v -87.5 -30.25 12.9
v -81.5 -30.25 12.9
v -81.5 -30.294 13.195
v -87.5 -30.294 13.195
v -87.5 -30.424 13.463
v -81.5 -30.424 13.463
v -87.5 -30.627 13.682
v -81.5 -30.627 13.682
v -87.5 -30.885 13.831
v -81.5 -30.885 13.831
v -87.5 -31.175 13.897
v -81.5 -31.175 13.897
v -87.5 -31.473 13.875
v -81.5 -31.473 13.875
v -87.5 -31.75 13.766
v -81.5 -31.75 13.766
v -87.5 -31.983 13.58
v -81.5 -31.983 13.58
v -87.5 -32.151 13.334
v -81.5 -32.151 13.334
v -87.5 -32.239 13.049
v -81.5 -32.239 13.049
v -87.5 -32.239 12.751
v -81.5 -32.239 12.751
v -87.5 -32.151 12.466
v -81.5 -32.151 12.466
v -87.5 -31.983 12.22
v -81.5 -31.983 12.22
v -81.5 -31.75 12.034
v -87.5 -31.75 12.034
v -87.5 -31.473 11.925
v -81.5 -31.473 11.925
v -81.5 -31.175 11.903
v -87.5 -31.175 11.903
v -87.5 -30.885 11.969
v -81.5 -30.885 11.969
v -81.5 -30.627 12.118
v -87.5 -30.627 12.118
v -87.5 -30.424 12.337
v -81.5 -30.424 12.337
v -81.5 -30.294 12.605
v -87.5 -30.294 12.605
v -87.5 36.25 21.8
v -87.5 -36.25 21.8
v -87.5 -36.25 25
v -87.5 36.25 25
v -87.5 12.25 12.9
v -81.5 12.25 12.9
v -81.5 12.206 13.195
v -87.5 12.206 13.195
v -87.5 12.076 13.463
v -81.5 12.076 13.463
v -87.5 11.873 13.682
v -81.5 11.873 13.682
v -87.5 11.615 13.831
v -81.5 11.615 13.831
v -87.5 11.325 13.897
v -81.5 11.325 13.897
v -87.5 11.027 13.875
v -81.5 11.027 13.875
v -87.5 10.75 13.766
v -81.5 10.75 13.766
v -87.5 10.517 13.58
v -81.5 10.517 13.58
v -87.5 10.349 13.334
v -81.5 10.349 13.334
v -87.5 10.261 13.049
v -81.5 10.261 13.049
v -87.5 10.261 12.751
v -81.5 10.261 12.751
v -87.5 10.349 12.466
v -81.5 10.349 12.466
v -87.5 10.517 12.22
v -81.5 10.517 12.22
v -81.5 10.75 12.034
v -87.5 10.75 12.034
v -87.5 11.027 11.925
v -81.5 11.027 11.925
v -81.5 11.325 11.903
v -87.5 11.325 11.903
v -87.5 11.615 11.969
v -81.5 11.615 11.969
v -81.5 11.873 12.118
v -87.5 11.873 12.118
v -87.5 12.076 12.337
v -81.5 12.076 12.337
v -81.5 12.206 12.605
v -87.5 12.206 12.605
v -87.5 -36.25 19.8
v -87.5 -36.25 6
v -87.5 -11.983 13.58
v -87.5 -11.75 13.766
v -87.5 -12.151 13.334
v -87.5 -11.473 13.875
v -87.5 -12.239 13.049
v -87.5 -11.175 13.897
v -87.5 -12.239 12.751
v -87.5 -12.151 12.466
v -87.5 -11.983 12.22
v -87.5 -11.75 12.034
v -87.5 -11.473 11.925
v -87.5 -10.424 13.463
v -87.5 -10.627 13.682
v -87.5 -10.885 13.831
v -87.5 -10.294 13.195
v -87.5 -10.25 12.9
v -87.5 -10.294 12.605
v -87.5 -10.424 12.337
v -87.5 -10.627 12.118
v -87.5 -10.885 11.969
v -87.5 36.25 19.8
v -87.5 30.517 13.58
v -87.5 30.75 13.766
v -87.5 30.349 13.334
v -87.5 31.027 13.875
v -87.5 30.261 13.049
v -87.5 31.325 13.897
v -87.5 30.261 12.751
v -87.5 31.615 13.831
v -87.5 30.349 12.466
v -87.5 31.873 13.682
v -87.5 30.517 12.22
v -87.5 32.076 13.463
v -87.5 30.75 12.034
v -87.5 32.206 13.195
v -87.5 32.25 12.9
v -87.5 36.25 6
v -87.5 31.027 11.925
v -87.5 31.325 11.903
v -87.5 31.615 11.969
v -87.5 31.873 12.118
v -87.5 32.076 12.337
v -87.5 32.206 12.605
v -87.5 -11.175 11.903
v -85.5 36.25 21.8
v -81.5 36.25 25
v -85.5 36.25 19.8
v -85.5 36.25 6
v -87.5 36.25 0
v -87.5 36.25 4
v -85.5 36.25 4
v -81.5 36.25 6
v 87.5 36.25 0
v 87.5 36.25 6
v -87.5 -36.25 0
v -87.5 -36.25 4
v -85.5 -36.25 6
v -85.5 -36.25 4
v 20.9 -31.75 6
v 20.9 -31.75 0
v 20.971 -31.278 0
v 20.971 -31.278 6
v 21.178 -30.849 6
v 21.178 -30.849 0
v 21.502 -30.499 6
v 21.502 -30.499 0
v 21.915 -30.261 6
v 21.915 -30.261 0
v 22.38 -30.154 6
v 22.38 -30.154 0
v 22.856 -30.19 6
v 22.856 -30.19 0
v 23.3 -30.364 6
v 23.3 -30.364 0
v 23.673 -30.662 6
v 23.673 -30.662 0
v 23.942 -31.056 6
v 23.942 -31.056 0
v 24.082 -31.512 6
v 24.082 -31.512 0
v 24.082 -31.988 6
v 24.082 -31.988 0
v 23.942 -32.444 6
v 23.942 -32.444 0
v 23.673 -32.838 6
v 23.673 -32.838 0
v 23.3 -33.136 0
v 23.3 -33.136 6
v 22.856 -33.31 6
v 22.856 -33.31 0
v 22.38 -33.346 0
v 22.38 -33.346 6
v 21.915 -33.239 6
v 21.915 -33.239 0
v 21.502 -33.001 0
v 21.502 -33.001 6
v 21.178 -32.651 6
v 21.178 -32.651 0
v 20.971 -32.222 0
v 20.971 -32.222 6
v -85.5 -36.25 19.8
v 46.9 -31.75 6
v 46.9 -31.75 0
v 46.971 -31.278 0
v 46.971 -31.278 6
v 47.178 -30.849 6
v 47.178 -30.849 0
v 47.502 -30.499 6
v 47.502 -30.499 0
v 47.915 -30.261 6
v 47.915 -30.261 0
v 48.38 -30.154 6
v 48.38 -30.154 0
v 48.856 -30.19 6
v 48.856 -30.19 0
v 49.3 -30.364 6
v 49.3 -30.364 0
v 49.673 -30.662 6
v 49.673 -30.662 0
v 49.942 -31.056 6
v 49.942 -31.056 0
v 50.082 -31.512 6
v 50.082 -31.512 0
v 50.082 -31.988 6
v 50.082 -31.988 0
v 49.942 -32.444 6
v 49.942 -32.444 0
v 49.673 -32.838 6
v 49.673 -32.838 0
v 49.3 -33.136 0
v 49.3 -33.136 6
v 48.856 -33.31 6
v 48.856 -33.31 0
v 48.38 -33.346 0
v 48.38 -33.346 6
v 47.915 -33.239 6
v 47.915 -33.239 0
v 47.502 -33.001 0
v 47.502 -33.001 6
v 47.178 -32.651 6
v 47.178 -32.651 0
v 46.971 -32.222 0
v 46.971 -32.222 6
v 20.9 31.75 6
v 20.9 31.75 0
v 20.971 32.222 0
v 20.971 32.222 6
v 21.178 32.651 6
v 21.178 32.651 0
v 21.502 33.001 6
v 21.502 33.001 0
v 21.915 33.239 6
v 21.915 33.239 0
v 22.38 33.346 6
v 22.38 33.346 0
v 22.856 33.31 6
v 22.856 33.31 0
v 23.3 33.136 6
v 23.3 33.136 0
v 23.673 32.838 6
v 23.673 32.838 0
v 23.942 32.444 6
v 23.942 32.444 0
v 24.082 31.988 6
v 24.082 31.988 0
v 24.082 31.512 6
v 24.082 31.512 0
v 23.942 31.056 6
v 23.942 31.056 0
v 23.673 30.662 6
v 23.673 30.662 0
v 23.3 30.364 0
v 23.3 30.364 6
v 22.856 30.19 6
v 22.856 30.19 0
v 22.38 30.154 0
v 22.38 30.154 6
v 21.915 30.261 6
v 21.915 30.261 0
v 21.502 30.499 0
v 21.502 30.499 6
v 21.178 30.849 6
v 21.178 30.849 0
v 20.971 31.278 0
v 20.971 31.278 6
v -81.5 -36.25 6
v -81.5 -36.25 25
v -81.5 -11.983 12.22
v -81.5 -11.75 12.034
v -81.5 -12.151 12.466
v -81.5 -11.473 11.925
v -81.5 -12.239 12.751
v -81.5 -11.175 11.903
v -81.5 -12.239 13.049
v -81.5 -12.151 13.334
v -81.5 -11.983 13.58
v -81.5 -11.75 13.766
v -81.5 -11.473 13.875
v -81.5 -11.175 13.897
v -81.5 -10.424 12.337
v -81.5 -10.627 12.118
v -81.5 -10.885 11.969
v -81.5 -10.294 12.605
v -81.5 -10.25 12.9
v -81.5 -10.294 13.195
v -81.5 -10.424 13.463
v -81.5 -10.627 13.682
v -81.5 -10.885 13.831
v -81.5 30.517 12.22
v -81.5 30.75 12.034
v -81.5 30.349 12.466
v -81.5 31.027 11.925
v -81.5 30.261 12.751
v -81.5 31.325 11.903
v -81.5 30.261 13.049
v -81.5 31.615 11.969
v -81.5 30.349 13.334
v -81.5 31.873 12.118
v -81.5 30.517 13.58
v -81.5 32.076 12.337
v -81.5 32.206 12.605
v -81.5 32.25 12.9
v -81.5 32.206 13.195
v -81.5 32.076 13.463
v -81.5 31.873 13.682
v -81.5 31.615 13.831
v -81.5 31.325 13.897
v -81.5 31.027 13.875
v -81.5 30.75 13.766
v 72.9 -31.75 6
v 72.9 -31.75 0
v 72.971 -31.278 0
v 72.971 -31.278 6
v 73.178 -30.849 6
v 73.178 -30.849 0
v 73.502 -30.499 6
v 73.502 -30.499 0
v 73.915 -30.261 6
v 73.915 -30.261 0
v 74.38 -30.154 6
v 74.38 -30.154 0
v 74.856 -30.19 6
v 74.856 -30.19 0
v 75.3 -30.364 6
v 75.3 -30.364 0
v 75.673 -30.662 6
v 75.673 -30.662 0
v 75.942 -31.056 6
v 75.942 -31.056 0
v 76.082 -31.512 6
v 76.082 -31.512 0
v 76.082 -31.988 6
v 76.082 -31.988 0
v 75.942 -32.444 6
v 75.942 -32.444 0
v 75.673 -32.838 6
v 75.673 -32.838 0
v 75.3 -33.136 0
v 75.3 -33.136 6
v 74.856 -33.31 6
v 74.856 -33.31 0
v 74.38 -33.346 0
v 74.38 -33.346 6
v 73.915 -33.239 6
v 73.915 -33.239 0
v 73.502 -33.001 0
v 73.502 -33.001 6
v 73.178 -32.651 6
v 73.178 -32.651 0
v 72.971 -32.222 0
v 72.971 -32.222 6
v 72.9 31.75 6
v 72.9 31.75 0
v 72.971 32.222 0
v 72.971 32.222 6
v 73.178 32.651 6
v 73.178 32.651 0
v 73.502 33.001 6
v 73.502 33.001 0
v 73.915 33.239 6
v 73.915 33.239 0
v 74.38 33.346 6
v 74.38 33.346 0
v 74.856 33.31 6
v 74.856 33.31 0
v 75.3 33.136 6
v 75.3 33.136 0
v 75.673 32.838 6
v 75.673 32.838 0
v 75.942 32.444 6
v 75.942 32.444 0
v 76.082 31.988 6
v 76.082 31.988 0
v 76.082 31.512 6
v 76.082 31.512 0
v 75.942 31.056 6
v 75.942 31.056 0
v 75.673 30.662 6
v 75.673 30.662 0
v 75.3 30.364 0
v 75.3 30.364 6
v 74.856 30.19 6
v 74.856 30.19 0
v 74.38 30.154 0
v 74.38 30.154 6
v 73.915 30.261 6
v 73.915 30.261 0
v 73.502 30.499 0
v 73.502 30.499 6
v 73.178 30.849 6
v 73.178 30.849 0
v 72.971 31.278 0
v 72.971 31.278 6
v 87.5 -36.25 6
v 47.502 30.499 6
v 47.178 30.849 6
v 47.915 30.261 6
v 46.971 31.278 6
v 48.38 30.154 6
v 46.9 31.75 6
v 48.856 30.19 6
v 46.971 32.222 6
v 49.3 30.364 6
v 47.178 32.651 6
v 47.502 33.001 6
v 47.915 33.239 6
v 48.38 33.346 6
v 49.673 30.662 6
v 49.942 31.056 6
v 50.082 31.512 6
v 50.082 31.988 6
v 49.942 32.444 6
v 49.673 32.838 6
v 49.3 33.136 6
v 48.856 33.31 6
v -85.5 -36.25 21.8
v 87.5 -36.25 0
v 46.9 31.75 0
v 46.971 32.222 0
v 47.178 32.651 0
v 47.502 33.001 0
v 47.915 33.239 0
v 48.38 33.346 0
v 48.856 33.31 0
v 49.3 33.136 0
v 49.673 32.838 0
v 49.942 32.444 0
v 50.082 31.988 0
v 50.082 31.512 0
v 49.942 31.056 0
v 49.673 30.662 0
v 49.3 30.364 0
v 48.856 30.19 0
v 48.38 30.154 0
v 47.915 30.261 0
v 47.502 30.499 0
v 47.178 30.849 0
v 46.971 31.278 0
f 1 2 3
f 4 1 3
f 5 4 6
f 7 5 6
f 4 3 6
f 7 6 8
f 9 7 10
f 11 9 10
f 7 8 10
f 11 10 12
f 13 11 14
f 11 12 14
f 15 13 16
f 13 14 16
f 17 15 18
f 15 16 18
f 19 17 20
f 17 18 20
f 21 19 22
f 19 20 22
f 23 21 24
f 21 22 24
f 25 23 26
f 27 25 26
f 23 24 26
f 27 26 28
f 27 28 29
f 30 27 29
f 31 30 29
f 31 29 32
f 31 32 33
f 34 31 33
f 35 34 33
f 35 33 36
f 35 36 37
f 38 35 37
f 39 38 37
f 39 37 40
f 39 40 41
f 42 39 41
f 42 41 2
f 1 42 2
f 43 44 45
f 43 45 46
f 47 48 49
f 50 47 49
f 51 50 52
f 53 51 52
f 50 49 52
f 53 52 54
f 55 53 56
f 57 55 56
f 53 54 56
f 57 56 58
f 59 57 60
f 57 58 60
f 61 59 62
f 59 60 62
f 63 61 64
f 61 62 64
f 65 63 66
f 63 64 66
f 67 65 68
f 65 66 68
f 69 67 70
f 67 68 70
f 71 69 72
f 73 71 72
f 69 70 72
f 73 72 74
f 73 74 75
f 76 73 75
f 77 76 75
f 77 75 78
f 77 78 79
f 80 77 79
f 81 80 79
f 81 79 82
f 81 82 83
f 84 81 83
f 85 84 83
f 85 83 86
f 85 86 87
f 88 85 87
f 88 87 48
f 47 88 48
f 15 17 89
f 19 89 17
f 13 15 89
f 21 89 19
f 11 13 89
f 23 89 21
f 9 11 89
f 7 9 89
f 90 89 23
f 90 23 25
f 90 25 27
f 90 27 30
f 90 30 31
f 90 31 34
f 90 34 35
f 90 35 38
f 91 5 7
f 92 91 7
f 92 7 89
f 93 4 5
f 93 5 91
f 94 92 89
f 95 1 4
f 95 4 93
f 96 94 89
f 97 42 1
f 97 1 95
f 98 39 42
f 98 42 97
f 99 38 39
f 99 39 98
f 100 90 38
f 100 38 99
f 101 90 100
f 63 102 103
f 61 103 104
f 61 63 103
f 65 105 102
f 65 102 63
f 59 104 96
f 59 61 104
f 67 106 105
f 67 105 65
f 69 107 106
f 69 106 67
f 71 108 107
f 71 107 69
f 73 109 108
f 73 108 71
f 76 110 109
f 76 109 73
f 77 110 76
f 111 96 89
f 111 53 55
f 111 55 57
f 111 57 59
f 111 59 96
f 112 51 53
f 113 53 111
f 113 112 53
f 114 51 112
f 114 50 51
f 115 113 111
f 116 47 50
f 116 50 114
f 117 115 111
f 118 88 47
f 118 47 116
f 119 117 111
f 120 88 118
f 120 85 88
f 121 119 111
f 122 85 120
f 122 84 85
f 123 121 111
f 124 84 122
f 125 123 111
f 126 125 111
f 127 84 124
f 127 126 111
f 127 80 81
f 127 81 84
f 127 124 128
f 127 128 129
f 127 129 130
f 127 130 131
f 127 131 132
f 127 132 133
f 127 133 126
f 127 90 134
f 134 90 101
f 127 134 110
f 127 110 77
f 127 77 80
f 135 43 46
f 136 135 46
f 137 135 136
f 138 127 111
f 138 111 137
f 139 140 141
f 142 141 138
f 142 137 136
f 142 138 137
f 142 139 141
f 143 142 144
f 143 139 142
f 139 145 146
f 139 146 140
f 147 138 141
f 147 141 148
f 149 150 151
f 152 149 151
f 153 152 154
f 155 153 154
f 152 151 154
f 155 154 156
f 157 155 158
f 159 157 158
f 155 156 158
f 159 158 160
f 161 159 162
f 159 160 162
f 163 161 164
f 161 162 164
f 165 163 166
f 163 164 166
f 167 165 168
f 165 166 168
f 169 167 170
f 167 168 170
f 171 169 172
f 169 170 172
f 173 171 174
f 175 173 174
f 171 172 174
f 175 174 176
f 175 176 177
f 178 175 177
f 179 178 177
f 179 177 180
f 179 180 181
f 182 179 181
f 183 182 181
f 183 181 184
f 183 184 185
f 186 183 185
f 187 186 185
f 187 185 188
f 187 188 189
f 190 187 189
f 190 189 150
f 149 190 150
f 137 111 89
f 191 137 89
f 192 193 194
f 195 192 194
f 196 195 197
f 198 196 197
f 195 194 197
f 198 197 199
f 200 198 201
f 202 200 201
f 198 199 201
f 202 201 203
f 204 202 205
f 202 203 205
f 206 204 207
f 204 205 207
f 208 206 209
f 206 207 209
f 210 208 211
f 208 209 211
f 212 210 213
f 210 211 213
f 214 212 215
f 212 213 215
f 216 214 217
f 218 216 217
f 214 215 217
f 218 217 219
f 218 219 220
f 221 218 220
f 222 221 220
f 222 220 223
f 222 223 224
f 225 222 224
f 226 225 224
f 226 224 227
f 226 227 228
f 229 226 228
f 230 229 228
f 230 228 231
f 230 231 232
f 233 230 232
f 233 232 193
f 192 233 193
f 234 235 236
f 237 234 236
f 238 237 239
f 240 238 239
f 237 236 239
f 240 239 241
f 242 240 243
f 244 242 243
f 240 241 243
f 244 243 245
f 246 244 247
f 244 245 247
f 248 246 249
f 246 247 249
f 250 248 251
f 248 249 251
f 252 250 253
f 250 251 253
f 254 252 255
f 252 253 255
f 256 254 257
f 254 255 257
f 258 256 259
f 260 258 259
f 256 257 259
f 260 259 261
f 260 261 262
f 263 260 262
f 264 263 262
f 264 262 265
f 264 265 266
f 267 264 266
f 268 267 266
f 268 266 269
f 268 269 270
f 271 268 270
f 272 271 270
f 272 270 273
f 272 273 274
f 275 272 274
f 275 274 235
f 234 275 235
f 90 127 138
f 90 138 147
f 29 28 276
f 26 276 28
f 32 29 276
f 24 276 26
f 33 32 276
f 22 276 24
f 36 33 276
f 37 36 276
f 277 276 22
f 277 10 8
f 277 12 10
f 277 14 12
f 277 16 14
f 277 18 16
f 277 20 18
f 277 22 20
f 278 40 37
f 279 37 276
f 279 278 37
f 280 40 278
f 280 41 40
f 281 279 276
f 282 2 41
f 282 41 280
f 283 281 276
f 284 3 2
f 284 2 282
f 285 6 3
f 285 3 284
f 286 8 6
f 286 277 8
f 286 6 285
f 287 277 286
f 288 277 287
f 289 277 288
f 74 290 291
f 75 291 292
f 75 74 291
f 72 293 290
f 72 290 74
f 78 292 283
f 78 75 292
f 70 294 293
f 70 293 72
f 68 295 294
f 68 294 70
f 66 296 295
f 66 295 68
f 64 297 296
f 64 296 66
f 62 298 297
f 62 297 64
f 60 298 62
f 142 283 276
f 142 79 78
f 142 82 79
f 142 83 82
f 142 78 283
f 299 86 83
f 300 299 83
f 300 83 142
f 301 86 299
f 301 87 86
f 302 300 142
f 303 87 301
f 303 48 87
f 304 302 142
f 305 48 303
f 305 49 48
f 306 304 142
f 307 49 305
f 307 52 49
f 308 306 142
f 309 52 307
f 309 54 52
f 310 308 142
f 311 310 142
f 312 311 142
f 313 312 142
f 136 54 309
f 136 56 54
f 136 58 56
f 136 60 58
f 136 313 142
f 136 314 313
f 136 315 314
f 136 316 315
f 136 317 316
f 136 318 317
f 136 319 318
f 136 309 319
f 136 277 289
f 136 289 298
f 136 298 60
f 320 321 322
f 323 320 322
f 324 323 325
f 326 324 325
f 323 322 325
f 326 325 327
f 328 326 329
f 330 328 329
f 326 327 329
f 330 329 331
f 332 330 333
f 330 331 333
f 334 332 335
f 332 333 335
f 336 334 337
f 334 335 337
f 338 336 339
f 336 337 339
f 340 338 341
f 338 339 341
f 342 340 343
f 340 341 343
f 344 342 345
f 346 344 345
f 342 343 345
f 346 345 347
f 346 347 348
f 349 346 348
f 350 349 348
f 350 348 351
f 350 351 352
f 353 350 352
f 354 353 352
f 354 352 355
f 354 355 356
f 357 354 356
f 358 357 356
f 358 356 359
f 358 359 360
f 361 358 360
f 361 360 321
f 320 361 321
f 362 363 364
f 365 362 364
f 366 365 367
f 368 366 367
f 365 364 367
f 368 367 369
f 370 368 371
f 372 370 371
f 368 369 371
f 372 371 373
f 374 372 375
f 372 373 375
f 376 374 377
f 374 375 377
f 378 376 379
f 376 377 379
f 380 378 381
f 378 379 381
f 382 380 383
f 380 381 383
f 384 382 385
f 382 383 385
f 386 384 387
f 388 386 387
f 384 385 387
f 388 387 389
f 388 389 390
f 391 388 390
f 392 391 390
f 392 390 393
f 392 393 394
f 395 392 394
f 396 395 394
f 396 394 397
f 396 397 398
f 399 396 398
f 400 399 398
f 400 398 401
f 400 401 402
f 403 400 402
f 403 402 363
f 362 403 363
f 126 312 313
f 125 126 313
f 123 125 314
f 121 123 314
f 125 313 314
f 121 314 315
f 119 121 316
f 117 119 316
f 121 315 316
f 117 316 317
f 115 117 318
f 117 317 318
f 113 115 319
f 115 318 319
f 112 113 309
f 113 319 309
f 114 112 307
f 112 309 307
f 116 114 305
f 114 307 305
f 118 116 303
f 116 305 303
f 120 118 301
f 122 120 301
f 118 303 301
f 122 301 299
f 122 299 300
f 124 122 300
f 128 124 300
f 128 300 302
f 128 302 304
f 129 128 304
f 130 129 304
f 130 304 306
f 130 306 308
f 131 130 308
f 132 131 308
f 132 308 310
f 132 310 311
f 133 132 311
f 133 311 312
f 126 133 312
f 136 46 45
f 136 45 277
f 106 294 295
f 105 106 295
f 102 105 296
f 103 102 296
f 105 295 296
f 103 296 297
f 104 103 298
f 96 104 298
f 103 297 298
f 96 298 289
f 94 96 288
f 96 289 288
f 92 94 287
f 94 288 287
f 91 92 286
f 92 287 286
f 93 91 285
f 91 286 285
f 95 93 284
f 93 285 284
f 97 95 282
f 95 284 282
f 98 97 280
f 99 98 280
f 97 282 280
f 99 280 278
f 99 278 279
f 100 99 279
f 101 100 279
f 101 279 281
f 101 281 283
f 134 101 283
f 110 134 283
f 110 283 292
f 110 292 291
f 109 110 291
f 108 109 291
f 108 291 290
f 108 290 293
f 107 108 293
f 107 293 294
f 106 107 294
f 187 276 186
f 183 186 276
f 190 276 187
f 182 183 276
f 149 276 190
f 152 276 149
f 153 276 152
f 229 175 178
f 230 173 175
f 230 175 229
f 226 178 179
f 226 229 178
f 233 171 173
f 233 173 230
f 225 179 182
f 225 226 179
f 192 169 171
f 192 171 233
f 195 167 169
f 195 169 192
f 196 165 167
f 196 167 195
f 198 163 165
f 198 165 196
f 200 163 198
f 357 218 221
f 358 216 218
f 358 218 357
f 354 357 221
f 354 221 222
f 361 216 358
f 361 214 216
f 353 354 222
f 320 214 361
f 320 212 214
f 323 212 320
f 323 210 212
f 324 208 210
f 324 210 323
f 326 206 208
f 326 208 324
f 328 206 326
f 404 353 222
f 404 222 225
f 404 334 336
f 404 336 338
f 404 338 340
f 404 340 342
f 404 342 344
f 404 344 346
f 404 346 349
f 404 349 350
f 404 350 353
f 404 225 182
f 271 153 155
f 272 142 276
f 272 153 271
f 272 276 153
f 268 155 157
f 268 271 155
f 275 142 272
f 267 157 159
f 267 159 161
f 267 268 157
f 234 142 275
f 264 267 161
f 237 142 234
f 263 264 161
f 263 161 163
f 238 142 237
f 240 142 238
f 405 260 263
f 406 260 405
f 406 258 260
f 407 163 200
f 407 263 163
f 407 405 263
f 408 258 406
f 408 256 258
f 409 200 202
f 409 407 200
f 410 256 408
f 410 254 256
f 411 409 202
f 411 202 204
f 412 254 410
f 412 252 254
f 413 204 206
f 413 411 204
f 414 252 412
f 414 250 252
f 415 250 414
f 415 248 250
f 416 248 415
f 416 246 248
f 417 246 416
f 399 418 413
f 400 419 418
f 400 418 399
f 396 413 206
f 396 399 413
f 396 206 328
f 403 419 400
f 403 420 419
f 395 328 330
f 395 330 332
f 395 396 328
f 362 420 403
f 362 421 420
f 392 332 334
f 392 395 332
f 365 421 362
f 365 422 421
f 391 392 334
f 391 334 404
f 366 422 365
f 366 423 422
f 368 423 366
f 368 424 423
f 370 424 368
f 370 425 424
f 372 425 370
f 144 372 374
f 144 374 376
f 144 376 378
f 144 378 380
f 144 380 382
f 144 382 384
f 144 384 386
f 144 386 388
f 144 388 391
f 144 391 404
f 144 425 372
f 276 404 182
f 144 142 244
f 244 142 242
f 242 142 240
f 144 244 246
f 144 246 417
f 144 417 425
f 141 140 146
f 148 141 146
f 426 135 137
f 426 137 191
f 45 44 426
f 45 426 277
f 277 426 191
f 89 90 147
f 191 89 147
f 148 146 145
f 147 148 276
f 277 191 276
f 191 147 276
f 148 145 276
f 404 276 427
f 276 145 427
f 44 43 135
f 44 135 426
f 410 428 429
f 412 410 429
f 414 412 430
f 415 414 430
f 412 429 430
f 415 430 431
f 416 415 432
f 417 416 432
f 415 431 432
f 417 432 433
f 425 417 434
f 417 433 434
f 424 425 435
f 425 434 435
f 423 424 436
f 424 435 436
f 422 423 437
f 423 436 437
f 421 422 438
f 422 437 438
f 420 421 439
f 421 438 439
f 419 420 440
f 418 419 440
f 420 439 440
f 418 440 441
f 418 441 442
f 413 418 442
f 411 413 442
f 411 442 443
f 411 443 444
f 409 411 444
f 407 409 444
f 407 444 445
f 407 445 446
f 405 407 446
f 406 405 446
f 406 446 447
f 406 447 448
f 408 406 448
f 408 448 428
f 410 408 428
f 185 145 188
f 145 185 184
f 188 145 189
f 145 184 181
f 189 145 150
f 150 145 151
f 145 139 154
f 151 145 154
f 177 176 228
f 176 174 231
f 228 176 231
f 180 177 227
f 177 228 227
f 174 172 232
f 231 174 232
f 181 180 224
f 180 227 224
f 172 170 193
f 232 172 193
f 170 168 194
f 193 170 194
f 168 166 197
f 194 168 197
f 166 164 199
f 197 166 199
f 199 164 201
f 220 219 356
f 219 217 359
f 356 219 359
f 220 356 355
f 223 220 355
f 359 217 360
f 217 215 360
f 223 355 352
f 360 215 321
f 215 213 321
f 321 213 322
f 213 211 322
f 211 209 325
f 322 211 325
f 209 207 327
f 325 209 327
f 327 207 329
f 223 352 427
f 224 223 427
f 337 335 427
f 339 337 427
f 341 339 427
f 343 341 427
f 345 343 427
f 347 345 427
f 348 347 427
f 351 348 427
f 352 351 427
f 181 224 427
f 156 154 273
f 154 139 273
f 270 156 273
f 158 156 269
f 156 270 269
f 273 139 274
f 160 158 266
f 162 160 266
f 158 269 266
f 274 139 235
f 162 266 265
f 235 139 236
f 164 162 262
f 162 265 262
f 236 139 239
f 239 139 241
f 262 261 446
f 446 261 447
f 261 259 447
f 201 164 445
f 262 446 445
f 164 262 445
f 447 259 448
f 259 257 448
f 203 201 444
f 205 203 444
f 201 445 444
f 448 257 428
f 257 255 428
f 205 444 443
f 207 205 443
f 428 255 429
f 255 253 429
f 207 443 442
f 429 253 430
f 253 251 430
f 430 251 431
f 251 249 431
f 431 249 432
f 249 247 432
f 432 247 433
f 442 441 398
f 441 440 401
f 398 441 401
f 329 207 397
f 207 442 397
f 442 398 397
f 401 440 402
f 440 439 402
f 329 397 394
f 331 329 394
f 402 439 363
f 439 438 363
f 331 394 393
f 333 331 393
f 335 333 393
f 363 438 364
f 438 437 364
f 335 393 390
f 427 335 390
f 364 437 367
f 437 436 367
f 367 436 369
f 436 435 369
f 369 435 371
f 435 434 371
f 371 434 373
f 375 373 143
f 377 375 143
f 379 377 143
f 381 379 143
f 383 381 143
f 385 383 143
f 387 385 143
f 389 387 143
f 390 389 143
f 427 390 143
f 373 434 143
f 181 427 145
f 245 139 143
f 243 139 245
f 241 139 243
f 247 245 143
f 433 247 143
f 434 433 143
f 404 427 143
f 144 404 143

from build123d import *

# Parameters (mm, degrees)
F0_W     = 175
F0_H     = 72.5
F1_DEPTH = 25
F2_W     = 169
F2_H     = 72.5
F3_DEPTH = 19
F5_D     = 3.2
F6_W     = 72.5
F6_H     = 2
F7_DEPTH = 2
F9_D     = 2


with BuildPart() as f1:
    # F0 (on Top) → F1 (new body)
    with BuildSketch(Plane.XY):
        Rectangle(F0_W, F0_H)
    extrude(amount=F1_DEPTH)

    # F2 (on face) → F3 (cut)
    with BuildSketch(Plane.XY.offset(25)):
        with Locations((3, 0)):
            Rectangle(F2_W, F2_H)
    extrude(amount=-F3_DEPTH, mode=Mode.SUBTRACT)

    # F5 (through all)
    with Locations(Plane.XY.offset(6)):
        with Locations((22.5, 31.75), (48.5, 31.75), (74.5, 31.75), (74.5, -31.75), (48.5, -31.75), (22.5, -31.75)):
            Hole(F5_D / 2)

    # F6 (on face) → F7 (cut)
    with BuildSketch(Plane(origin=(-87.5, 0, 0), x_dir=(0, -1, 0), z_dir=(-1, 0, 0))):
        with Locations((0, 5)):
            Rectangle(F6_W, F6_H)
        with Locations((0, 20.8)):
            Rectangle(F6_W, F6_H)
    extrude(amount=-F7_DEPTH, mode=Mode.SUBTRACT)

    # F9 (through all)
    with Locations(Plane(origin=(-87.5, 0, 0), x_dir=(0, -1, 0), z_dir=(-1, 0, 0))):
        with Locations((-31.25, 12.9), (-11.25, 12.9), (11.25, 12.9), (31.25, 12.9)):
            Hole(F9_D / 2)


solid = f1.part
